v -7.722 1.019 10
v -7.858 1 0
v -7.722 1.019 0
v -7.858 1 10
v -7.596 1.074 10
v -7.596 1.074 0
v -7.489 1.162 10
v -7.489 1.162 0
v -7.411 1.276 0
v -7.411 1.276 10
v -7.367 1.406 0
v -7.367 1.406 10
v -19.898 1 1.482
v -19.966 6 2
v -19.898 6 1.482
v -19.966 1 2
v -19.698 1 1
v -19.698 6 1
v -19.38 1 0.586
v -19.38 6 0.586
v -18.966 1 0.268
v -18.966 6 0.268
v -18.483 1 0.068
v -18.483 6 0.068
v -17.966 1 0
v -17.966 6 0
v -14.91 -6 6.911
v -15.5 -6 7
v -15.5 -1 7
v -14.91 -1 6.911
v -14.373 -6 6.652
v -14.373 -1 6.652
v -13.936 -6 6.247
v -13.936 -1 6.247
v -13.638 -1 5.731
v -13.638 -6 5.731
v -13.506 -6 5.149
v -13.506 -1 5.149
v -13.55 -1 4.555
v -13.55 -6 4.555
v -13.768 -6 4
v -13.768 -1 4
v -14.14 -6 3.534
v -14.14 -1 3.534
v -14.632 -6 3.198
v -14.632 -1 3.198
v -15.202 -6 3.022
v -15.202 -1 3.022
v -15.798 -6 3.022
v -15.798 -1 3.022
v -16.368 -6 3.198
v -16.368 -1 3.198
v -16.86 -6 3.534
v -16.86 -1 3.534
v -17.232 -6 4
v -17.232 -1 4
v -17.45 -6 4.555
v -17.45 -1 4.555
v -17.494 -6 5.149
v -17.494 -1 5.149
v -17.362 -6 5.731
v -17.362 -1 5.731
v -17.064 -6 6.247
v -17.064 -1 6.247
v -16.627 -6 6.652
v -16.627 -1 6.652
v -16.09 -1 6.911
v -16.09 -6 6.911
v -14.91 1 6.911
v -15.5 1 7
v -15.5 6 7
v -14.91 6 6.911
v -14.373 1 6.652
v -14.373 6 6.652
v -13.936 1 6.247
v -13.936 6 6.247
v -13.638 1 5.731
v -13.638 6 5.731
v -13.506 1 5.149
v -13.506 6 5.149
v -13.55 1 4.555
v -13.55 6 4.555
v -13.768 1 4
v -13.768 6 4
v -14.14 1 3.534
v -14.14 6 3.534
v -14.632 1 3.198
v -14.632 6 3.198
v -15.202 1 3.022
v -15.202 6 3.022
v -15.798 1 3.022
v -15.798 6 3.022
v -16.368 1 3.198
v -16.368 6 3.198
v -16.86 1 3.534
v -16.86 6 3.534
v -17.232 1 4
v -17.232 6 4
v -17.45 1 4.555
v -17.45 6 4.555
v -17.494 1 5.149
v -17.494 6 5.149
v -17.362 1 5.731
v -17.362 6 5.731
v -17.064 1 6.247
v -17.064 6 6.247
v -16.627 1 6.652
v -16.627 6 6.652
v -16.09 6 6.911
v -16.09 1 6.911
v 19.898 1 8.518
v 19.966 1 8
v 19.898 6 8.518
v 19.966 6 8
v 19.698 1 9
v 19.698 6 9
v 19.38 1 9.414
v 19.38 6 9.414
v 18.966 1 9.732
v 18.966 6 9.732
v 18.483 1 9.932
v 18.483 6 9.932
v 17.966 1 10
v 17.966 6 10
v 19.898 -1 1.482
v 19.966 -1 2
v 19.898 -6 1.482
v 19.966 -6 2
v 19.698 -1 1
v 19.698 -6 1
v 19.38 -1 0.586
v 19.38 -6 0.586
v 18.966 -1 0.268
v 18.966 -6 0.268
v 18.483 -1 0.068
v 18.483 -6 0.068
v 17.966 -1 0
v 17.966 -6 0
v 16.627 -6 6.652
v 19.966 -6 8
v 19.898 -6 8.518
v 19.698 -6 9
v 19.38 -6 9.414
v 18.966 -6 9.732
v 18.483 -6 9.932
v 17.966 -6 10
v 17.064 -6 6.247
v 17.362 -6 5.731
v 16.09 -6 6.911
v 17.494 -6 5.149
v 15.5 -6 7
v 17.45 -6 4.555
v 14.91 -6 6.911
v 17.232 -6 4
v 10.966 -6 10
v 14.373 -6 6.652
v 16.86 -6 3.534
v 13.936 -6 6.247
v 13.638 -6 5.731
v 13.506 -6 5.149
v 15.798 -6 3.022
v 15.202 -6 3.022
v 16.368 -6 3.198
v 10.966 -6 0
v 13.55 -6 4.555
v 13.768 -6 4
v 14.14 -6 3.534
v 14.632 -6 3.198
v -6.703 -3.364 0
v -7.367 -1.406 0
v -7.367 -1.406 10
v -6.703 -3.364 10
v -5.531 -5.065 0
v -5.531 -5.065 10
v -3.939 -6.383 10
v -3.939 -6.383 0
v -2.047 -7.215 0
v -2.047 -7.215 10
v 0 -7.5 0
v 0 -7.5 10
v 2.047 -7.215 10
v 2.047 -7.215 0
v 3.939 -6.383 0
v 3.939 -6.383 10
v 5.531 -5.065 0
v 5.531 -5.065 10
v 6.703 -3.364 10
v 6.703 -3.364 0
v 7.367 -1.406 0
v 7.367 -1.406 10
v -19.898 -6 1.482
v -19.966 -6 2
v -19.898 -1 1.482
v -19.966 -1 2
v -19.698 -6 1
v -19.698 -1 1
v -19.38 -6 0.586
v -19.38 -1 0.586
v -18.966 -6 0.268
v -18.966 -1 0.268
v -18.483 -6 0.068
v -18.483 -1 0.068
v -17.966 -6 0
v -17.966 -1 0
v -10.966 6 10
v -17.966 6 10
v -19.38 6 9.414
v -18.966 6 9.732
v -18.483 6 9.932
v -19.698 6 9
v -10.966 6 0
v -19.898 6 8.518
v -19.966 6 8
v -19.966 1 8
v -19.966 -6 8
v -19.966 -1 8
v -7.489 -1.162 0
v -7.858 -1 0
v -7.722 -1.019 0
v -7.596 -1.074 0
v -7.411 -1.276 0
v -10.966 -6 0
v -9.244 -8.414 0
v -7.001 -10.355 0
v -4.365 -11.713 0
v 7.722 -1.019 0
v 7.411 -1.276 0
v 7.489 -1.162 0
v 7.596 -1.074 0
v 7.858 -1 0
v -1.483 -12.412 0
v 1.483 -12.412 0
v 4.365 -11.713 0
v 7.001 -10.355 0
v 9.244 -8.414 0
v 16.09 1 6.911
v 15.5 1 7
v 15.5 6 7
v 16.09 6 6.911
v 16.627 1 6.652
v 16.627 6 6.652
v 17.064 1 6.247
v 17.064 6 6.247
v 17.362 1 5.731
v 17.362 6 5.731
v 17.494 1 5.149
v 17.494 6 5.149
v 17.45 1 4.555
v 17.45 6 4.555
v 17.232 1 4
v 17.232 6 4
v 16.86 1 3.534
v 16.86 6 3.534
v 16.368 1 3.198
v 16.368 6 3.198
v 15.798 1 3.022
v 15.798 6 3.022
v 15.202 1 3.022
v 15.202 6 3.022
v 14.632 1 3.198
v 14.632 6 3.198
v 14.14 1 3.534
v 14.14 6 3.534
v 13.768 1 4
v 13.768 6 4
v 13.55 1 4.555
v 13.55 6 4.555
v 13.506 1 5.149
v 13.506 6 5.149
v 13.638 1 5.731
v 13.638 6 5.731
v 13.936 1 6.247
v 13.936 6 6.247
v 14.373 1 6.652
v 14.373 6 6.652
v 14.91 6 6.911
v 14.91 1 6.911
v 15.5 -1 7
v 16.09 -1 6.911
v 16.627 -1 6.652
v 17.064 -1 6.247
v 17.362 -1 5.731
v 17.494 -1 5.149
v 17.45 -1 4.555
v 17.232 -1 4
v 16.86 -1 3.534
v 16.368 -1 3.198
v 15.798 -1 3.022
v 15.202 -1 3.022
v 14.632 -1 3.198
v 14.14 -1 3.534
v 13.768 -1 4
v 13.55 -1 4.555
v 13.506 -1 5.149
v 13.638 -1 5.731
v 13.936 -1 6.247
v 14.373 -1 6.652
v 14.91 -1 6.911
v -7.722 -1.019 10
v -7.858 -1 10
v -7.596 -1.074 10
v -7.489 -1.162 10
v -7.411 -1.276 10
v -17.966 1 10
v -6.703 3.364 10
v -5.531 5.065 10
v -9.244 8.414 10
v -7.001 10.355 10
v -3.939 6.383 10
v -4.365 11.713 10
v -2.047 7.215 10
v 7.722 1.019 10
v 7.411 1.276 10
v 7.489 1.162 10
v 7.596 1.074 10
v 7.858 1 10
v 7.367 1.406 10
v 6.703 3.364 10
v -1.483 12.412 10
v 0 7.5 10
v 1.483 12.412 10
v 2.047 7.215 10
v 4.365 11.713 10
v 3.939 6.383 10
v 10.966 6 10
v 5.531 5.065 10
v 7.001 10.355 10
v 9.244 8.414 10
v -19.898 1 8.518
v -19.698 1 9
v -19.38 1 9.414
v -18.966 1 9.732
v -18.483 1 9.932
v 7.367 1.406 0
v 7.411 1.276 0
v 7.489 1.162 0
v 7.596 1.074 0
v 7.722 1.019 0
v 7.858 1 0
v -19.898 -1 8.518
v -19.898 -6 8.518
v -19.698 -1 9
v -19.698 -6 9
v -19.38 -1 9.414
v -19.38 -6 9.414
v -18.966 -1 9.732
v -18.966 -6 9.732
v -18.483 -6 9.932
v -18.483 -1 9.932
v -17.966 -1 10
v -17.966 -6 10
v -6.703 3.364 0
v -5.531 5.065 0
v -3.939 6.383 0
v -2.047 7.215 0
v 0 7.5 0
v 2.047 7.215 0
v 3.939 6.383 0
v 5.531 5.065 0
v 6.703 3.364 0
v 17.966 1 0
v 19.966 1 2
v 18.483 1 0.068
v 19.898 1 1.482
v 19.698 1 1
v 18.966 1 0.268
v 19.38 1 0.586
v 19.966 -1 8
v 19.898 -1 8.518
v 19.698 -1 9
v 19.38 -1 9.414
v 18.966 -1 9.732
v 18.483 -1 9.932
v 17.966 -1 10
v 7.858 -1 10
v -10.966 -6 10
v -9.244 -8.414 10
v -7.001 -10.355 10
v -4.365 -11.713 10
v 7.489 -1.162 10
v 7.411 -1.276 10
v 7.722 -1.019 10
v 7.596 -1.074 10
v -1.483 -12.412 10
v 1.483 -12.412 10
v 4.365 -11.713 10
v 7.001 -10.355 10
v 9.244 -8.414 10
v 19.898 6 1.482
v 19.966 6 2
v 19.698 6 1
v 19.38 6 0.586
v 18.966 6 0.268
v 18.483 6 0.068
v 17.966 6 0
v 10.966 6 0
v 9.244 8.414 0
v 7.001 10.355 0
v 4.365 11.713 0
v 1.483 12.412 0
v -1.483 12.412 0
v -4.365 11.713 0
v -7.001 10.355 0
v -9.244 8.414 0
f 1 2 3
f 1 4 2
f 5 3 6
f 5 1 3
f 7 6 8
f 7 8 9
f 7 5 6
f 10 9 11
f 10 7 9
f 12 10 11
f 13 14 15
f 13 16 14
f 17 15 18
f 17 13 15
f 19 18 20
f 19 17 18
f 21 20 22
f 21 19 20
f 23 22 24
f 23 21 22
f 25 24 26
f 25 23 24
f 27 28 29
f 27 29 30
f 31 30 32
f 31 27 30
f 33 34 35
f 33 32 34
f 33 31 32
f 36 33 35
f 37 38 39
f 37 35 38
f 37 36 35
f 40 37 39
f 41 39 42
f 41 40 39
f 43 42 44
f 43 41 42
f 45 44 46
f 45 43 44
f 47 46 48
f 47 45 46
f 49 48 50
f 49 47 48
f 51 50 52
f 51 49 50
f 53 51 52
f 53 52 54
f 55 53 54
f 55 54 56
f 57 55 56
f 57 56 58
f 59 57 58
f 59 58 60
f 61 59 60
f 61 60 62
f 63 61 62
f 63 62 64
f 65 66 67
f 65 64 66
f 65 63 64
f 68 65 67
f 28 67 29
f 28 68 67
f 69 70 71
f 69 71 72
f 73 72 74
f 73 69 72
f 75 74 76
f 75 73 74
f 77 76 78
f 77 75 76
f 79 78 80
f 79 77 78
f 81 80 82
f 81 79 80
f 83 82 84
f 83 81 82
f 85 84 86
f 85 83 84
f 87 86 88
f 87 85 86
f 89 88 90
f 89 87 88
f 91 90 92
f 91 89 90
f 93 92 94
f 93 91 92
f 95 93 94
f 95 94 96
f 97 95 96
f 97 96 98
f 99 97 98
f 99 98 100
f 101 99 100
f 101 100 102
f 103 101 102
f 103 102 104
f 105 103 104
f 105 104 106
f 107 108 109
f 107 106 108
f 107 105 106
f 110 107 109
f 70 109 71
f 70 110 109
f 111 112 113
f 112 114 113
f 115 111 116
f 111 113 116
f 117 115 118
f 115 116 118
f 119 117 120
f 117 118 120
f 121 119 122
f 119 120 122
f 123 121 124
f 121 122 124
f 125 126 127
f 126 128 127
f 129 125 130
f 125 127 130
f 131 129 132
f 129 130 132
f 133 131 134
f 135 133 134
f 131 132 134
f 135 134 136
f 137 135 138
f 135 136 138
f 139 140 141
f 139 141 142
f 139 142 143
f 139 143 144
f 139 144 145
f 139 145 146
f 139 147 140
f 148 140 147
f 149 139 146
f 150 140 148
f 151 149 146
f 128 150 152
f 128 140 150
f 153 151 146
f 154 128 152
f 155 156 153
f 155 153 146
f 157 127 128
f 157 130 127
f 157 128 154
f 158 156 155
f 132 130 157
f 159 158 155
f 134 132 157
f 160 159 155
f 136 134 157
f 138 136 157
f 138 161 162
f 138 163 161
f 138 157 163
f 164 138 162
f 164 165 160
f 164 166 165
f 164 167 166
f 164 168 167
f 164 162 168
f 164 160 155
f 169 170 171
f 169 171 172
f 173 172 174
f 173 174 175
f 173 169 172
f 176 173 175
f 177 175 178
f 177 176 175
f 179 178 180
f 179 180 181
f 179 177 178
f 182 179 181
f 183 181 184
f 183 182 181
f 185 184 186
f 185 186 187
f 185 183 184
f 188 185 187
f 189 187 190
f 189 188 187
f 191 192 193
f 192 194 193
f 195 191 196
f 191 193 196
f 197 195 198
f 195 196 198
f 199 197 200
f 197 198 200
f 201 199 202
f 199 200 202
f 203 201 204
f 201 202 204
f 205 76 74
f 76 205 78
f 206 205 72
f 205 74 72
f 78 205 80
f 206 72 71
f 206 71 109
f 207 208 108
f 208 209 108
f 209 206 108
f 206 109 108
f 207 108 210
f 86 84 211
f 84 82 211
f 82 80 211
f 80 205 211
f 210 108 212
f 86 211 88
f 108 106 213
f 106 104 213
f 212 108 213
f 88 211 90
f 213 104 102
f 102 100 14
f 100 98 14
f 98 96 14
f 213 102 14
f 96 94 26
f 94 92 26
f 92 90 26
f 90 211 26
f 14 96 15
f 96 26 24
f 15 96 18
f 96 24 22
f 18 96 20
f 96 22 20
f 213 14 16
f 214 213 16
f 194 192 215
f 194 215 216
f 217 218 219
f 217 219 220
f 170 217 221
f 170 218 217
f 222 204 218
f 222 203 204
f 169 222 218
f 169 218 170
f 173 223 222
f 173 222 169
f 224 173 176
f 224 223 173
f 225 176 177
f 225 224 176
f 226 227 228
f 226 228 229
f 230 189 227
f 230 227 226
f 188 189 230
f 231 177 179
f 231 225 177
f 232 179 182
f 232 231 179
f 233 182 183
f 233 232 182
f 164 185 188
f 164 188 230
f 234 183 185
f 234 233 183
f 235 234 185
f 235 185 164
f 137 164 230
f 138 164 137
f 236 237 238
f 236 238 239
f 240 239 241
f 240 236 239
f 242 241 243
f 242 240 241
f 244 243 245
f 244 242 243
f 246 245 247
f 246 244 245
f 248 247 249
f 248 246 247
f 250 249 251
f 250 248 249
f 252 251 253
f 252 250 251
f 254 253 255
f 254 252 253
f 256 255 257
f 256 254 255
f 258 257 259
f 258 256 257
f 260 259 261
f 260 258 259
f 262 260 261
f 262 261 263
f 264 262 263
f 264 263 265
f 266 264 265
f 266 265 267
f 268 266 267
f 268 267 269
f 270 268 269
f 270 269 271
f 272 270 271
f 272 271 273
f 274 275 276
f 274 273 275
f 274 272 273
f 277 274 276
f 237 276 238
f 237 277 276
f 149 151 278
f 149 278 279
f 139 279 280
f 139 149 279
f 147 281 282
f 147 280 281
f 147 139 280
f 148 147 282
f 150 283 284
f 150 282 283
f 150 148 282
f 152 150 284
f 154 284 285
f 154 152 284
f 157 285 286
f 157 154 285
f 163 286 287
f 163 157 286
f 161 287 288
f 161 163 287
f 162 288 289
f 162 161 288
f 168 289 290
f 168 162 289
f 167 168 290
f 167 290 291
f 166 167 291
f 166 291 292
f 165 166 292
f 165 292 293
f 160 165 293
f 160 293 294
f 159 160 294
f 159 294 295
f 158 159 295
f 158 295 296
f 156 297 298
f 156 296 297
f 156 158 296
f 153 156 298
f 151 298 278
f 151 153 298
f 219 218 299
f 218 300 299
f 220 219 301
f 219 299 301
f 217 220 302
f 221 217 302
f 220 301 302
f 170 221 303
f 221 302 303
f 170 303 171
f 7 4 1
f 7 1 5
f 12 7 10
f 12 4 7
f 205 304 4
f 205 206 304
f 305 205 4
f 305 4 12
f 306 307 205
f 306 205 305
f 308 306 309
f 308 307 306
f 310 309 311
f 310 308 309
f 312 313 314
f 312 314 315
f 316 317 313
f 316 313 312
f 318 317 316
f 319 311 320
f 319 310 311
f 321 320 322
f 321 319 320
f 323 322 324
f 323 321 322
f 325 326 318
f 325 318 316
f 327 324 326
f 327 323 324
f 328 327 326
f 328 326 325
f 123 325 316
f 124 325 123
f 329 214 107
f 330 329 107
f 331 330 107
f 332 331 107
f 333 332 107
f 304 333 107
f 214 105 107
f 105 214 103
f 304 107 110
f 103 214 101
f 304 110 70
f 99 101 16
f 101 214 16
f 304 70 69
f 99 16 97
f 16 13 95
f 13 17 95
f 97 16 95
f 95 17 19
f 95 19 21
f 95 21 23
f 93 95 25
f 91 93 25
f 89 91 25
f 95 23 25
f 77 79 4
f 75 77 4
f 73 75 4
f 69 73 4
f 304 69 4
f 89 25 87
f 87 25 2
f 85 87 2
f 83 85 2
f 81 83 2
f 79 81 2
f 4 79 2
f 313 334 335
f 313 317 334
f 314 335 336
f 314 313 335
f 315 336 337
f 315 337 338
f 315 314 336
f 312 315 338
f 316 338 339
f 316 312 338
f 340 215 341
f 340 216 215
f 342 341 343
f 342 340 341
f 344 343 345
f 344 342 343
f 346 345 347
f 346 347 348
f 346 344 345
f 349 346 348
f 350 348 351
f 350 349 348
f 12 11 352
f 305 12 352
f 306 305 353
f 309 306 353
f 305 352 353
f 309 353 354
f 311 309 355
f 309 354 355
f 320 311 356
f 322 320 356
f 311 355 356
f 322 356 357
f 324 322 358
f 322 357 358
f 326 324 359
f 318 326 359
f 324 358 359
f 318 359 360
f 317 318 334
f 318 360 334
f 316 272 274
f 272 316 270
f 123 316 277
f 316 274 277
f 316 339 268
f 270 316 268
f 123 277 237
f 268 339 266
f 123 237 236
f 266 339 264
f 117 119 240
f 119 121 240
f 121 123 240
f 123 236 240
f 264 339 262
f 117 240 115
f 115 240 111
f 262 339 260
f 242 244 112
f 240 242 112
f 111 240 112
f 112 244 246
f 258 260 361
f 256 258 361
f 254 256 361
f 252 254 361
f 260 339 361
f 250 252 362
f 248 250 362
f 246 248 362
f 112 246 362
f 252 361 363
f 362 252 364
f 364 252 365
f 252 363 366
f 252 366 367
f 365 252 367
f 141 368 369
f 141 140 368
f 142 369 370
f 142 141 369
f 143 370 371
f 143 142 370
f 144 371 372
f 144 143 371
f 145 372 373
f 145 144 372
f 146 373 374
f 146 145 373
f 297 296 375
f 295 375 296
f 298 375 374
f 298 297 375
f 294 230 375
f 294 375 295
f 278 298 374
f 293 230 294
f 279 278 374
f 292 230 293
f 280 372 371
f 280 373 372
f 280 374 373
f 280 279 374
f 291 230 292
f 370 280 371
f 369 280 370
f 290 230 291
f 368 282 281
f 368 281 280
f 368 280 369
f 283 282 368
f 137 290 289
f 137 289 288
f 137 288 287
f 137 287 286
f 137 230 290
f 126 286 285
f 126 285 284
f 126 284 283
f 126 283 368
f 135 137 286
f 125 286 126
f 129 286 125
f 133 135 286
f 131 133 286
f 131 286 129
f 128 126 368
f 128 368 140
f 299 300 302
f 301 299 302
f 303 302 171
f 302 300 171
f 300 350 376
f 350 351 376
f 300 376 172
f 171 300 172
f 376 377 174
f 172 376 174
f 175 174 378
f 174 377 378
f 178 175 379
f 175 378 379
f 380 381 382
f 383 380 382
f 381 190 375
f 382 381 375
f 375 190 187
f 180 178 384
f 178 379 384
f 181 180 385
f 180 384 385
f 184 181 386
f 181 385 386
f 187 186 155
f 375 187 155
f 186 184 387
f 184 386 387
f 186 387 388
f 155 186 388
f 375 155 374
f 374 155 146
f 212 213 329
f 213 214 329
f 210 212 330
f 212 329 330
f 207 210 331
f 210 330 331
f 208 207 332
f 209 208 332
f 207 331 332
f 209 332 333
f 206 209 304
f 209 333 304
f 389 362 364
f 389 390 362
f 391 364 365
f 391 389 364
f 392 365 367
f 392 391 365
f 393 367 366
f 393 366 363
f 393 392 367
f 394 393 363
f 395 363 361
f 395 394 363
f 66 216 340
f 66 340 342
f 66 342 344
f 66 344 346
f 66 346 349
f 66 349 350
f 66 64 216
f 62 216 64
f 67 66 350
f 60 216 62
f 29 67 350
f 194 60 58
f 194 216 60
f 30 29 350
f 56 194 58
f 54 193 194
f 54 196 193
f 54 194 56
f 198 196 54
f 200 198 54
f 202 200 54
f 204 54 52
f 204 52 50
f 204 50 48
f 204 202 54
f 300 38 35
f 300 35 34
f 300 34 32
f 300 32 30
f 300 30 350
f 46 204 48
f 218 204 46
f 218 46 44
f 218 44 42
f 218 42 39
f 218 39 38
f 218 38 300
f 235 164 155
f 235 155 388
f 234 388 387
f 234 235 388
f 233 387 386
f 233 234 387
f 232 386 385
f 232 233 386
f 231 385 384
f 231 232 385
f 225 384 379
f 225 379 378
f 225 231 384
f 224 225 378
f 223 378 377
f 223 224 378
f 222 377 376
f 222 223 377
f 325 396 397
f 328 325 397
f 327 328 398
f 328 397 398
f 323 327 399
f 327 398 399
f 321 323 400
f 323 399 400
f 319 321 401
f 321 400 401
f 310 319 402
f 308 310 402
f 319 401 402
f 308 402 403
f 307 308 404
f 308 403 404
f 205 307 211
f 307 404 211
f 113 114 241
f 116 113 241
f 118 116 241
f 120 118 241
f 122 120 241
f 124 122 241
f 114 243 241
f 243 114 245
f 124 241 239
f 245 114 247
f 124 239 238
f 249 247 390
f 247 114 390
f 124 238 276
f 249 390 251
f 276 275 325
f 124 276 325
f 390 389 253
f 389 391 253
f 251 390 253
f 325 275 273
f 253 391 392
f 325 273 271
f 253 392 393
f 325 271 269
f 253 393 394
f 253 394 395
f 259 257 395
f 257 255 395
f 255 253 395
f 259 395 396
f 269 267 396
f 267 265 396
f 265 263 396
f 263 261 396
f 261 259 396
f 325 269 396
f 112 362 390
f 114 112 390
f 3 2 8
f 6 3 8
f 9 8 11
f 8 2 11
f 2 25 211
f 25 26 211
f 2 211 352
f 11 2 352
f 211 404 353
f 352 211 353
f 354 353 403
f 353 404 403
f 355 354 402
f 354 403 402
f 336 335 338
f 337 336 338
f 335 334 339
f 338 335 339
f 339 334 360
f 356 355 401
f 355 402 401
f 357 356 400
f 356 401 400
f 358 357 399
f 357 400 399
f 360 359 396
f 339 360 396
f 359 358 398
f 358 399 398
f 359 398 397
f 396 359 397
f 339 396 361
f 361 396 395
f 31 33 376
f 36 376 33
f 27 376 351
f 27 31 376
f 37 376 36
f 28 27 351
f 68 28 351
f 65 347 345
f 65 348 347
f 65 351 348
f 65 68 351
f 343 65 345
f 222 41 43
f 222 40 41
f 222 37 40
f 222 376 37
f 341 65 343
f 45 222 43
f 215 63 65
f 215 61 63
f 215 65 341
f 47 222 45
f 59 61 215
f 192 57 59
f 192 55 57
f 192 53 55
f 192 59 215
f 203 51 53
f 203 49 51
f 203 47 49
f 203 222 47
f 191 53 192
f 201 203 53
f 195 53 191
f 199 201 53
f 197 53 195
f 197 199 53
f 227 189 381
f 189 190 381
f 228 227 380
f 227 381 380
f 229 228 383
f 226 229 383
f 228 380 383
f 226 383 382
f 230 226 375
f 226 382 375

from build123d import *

# Parameters (mm, degrees)
BOSS_EXTRUDE1_DEPTH     = 10
FILLET1_R               = 2
FILLET3_R               = 0.5
CUT_EXTRUDE1_DEPTH      = 26.590728981
CUT_EXTRUDE1_DEPTH_BACK = 26.590728981
SKETCH3_R               = 2


with BuildPart() as part:
    # Sketch1 → Boss-Extrude1 (new body)
    with BuildSketch(Plane.XY):
        with BuildLine():
            Line((-19.9658561, 1), (-7.433034374, 1))
            ThreePointArc((-7.433034374, 1), (0, 7.5), (7.433034374, 1))
            Line((7.433034374, 1), (19.9658561, 1))
            Line((19.9658561, 1), (19.9658561, 6))
            Line((19.9658561, 6), (10.9658561, 6))
            ThreePointArc((10.9658561, 6), (0, 12.5), (-10.9658561, 6))
            Line((-10.9658561, 6), (-19.9658561, 6))
            Line((-19.9658561, 6), (-19.9658561, 1))
        make_face()
    extrude(amount=BOSS_EXTRUDE1_DEPTH)

    # Fillet1
    fillet1_edges = [part.edges().sort_by_distance(p)[0] for p in [
        (-19.9658561, 3.5, 0),
        (19.9658561, 3.5, 10),
        (-19.9658561, 3.5, 10),
        (19.9658561, 3.5, 0),
    ]]
    fillet(fillet1_edges, radius=FILLET1_R)

    # Fillet3
    fillet3_edges = [part.edges().sort_by_distance(p)[0] for p in [
        (7.433034374, 1, 5),
        (-7.433034374, 1, 5),
    ]]
    fillet(fillet3_edges, radius=FILLET3_R)


with BuildPart() as body_2:
    # Mirror3: mirrored copy
    add(part.part.mirror(Plane.ZX))


with BuildPart() as cut_extrude1_tool:
    # Sketch3 → Cut-Extrude1 (new, two sides: drawn at the far end of the back side and taken through both)
    with BuildSketch(Plane(origin=(0, 0, 0), x_dir=(1, 0, 0), z_dir=(0, 1, 0)).offset(-CUT_EXTRUDE1_DEPTH_BACK)):
        with Locations(Location((-15.5, -5, 0), (0, 0, 270))):
            Circle(SKETCH3_R)
        with Locations(Location((15.5, -5, 0), (0, 0, 270))):
            Circle(SKETCH3_R)
    extrude(amount=CUT_EXTRUDE1_DEPTH + CUT_EXTRUDE1_DEPTH_BACK)


with BuildPart() as part_1:
    add(part.part)

    # Cut-Extrude1: cut by cut_extrude1_tool
    add(cut_extrude1_tool.part, mode=Mode.SUBTRACT)


with BuildPart() as body_2_1:
    add(body_2.part)

    # Cut-Extrude1: cut by cut_extrude1_tool
    add(cut_extrude1_tool.part, mode=Mode.SUBTRACT)


solid = Compound([part_1.part, body_2_1.part])
